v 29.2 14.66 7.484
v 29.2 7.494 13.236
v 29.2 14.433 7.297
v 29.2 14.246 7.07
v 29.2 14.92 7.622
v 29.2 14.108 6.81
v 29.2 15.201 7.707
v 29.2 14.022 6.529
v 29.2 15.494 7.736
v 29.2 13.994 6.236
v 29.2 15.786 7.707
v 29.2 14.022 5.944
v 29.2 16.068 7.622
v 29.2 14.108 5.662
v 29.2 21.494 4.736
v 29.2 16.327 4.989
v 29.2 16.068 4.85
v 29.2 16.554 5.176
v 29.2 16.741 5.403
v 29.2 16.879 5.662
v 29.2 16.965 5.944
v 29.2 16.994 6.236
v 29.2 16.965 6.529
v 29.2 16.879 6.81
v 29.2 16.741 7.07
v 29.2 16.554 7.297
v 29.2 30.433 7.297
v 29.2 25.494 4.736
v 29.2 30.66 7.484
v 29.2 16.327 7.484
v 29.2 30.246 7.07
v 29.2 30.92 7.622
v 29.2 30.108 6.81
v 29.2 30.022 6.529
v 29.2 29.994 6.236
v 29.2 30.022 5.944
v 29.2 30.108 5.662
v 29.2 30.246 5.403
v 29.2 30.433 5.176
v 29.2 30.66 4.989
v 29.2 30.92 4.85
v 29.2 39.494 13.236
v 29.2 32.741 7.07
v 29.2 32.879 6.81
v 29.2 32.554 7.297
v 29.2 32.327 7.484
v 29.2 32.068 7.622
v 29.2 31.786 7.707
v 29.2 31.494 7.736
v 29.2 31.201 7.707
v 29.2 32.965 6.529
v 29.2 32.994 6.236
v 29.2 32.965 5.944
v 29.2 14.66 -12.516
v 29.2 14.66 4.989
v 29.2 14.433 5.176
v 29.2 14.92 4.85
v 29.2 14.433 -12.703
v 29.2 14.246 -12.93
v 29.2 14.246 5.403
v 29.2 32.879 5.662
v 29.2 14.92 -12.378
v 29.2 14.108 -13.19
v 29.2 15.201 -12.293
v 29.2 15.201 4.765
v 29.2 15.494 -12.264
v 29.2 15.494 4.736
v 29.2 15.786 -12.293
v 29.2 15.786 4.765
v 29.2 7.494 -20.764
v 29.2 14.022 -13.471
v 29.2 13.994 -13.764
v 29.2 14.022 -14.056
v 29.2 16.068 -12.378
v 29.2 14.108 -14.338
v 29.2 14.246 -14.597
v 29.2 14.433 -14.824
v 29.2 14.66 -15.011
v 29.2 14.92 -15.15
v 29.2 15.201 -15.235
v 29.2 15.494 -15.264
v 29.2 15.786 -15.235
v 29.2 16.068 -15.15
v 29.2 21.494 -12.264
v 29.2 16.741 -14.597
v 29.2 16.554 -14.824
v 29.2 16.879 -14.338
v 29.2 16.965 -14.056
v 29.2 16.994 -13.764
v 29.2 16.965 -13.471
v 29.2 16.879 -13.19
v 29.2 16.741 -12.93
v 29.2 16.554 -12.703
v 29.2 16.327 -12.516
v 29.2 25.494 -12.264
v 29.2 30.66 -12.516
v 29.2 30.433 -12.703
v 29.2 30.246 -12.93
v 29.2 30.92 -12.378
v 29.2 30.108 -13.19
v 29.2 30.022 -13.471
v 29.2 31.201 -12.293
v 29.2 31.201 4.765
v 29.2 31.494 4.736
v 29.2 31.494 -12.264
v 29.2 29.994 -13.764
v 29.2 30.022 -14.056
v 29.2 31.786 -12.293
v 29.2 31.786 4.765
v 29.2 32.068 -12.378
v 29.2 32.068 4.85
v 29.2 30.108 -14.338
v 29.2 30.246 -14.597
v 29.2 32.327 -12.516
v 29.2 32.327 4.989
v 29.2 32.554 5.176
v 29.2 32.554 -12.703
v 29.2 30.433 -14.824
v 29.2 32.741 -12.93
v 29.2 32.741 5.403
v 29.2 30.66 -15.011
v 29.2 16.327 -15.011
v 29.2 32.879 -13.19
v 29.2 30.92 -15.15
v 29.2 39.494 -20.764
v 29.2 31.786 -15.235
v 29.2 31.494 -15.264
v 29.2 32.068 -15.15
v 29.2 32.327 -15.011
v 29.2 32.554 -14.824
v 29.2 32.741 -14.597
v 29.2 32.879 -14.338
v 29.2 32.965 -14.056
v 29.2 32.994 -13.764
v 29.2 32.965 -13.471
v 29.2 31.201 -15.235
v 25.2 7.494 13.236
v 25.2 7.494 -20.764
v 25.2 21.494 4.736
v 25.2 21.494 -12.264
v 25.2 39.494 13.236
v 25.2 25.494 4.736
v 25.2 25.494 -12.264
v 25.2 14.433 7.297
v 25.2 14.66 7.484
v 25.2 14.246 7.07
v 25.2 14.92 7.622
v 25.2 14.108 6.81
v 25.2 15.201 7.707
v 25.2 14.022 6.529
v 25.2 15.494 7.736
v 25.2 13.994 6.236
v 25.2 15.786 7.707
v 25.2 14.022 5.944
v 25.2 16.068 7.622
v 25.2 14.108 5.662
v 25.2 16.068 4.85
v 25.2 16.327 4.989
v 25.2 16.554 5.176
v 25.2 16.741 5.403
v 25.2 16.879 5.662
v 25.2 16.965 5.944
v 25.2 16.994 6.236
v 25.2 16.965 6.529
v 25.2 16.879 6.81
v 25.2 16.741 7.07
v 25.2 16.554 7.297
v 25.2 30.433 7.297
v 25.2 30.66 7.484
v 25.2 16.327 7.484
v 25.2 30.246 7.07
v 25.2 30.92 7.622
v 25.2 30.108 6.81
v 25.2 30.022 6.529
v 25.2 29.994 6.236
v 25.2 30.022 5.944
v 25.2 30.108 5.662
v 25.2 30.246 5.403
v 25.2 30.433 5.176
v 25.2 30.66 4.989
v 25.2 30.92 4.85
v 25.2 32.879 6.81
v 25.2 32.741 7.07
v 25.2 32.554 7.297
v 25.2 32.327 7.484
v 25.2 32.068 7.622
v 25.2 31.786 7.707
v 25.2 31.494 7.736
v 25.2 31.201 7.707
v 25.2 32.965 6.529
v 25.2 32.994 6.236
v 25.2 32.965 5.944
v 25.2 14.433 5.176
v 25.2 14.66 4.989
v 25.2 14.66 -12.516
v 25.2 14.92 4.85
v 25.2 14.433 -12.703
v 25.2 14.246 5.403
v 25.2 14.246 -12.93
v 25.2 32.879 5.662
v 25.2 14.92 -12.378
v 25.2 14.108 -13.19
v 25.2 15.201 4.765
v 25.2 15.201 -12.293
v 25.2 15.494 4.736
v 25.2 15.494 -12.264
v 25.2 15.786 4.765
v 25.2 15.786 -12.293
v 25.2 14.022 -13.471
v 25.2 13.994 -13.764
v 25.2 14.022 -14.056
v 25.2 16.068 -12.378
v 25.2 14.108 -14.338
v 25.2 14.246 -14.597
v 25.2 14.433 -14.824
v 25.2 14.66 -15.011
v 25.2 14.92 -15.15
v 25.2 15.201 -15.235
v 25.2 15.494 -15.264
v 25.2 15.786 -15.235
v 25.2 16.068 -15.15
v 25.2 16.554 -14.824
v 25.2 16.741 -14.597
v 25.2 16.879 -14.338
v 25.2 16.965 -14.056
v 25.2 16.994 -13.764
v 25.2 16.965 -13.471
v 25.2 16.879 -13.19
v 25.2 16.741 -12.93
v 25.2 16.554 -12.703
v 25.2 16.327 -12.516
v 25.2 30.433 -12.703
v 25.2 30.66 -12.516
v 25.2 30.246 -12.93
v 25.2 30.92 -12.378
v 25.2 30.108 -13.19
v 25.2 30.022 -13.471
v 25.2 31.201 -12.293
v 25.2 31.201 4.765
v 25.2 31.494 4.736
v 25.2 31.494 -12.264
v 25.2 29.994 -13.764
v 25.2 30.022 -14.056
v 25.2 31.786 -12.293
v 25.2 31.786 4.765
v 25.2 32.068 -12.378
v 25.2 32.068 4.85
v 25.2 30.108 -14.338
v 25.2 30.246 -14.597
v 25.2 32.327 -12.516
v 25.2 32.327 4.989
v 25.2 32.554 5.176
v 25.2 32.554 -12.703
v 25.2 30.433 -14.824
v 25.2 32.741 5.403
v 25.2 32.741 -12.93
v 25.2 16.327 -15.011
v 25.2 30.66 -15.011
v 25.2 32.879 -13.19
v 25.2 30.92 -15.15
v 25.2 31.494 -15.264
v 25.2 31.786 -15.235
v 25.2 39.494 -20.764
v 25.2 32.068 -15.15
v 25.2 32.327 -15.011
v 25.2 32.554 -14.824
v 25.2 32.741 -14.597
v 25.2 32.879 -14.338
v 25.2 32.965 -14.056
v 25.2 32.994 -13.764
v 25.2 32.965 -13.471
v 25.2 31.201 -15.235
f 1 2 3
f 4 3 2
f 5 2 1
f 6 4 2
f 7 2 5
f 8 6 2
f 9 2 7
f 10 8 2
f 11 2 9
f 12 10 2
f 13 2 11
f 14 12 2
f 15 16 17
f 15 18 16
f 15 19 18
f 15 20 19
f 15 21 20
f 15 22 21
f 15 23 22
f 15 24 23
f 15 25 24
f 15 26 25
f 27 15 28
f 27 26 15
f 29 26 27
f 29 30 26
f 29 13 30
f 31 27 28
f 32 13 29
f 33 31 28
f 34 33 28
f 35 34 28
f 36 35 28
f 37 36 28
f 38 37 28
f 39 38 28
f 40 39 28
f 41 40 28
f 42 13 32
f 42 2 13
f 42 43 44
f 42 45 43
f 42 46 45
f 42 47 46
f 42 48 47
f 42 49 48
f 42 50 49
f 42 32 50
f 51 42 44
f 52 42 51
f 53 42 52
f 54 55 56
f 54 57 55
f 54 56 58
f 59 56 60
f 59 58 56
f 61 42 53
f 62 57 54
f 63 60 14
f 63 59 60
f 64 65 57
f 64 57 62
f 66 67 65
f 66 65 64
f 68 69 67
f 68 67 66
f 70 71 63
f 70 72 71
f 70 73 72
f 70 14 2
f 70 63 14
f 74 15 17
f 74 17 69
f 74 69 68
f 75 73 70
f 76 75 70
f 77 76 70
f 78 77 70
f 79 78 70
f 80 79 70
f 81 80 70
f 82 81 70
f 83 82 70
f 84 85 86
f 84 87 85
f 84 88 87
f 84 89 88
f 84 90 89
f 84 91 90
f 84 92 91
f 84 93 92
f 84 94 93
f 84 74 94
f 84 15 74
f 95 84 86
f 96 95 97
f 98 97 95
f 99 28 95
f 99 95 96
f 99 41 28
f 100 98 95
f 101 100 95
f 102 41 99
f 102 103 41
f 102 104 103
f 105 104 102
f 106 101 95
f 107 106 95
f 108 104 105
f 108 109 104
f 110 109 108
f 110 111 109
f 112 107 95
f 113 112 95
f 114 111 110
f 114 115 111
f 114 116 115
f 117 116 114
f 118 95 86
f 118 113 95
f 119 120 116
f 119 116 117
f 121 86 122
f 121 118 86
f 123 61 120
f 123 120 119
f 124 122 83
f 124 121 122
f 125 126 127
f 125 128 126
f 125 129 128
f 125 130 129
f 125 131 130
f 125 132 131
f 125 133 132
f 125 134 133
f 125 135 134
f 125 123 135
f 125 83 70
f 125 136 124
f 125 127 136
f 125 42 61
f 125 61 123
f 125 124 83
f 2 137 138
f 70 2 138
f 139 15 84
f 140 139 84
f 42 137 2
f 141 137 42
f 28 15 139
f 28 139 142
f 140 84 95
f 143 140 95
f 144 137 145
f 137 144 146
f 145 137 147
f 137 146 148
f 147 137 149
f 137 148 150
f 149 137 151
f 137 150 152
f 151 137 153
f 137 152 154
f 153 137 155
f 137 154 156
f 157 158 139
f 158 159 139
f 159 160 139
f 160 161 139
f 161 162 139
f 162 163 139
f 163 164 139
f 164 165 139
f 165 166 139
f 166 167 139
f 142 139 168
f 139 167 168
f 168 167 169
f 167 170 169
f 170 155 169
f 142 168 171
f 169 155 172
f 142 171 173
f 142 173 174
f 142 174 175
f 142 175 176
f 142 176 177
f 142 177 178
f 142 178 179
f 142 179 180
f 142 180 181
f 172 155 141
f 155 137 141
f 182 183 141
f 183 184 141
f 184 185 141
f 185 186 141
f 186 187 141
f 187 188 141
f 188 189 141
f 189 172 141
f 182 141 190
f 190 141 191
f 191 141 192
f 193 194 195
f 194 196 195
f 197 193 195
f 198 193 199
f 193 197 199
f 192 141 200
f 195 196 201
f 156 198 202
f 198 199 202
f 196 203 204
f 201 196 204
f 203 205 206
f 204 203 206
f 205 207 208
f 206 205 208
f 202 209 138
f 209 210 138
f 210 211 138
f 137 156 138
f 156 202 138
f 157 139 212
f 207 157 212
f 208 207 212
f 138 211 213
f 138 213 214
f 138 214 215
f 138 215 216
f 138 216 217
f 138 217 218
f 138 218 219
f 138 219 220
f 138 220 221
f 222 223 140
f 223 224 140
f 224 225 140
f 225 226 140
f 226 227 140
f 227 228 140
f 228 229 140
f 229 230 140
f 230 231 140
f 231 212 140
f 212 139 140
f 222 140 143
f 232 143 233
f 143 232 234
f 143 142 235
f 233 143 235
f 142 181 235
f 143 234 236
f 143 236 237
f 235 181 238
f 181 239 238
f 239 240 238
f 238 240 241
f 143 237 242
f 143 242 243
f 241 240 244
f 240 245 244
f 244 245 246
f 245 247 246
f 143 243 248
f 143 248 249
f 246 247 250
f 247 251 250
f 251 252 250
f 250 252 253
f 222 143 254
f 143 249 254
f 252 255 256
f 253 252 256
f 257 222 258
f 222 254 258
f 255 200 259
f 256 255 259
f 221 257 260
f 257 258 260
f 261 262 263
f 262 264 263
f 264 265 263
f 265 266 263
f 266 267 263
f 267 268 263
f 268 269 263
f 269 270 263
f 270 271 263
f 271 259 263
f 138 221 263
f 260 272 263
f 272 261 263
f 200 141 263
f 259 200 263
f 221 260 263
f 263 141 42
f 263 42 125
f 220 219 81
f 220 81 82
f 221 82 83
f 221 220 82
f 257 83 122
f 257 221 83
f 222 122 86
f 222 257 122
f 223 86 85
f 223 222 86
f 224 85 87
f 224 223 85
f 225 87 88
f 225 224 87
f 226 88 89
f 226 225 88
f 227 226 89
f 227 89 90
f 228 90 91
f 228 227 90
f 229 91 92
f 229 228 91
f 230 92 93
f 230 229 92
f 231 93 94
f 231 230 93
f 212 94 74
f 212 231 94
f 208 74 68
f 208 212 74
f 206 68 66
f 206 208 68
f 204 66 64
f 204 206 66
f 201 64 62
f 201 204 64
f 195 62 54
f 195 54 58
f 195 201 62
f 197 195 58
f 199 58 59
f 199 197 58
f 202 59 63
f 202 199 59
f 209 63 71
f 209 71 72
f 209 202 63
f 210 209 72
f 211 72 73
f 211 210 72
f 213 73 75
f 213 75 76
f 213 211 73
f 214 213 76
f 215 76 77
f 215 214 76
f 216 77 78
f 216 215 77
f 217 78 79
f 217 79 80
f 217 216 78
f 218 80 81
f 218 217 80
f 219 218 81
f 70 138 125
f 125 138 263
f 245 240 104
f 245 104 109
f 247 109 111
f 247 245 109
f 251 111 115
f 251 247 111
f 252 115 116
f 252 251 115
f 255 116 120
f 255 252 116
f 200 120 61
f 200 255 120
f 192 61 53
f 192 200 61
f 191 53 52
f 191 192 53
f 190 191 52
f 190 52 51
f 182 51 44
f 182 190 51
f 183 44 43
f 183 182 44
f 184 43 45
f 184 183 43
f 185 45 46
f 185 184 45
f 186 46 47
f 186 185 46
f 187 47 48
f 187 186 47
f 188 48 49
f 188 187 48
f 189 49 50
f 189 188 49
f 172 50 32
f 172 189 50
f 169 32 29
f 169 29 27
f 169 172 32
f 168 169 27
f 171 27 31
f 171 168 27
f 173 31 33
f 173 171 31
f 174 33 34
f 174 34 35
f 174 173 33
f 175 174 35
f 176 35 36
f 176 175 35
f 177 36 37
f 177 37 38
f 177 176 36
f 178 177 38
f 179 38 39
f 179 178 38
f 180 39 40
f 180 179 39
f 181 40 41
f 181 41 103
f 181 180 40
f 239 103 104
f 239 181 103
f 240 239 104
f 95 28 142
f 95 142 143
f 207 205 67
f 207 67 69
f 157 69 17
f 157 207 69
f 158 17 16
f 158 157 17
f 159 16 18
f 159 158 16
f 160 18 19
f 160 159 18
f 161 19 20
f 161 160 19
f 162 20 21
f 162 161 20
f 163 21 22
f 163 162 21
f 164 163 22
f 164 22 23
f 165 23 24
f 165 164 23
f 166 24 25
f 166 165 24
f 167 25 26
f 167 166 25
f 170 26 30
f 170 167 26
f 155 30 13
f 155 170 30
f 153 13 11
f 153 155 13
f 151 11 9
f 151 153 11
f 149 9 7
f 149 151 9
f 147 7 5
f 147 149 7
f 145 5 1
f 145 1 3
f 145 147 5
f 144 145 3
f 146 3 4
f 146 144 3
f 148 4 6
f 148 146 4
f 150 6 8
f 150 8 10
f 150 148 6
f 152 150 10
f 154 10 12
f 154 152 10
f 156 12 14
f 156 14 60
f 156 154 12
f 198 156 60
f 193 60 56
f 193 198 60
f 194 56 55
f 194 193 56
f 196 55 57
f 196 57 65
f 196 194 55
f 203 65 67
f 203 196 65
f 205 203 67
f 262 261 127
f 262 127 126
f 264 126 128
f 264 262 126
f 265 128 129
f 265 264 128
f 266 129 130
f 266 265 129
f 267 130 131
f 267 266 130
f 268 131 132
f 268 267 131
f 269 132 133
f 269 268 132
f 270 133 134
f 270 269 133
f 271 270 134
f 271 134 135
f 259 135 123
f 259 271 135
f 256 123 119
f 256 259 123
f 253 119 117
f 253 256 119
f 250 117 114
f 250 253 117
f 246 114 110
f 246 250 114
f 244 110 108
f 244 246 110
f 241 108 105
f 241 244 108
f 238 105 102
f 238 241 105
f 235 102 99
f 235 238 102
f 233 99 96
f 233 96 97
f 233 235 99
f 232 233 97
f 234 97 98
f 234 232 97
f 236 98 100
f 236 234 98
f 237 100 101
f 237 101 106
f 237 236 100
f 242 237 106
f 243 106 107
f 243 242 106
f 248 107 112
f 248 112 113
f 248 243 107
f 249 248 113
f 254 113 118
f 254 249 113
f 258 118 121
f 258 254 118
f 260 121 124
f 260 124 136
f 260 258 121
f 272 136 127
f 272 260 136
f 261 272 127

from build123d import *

# Parameters (mm, degrees)
SKETCH_1_W          = 34
SKETCH_1_H          = 32
SKETCH_1_R          = 1.5
EXTRUDE_1_DEPTH     = 4
SKETCH_2_W          = 17
SKETCH_2_H          = 4
CUT_EXTRUDE_1_DEPTH = 5


with BuildPart() as part:
    # Эскиз1 → Бобышка-Вытянуть1 (new body)
    with BuildSketch(Plane(origin=(25.2, 0, 0), x_dir=(0, 0, -1), z_dir=(1, 0, 0))):
        with Locations((3.763696673, 23.493617857)):
            Rectangle(SKETCH_1_W, SKETCH_1_H)
        with Locations((-6.236303327, 31.493617857)):
            Circle(SKETCH_1_R, mode=Mode.SUBTRACT)
        with Locations((13.763696673, 31.493617857)):
            Circle(SKETCH_1_R, mode=Mode.SUBTRACT)
        with Locations((-6.236303327, 15.493617857)):
            Circle(SKETCH_1_R, mode=Mode.SUBTRACT)
        with Locations((13.763696673, 15.493617857)):
            Circle(SKETCH_1_R, mode=Mode.SUBTRACT)
    extrude(amount=EXTRUDE_1_DEPTH)

    # Эскиз2 → Вырез-Вытянуть1 (cut, through all)
    with BuildSketch(Plane(origin=(29.2, 0, 0), x_dir=(0, 0, -1), z_dir=(1, 0, 0))):
        with Locations((3.763696673, 23.493617857)):
            Rectangle(SKETCH_2_W, SKETCH_2_H)
    extrude(amount=-CUT_EXTRUDE_1_DEPTH, mode=Mode.SUBTRACT)


solid = part.part
